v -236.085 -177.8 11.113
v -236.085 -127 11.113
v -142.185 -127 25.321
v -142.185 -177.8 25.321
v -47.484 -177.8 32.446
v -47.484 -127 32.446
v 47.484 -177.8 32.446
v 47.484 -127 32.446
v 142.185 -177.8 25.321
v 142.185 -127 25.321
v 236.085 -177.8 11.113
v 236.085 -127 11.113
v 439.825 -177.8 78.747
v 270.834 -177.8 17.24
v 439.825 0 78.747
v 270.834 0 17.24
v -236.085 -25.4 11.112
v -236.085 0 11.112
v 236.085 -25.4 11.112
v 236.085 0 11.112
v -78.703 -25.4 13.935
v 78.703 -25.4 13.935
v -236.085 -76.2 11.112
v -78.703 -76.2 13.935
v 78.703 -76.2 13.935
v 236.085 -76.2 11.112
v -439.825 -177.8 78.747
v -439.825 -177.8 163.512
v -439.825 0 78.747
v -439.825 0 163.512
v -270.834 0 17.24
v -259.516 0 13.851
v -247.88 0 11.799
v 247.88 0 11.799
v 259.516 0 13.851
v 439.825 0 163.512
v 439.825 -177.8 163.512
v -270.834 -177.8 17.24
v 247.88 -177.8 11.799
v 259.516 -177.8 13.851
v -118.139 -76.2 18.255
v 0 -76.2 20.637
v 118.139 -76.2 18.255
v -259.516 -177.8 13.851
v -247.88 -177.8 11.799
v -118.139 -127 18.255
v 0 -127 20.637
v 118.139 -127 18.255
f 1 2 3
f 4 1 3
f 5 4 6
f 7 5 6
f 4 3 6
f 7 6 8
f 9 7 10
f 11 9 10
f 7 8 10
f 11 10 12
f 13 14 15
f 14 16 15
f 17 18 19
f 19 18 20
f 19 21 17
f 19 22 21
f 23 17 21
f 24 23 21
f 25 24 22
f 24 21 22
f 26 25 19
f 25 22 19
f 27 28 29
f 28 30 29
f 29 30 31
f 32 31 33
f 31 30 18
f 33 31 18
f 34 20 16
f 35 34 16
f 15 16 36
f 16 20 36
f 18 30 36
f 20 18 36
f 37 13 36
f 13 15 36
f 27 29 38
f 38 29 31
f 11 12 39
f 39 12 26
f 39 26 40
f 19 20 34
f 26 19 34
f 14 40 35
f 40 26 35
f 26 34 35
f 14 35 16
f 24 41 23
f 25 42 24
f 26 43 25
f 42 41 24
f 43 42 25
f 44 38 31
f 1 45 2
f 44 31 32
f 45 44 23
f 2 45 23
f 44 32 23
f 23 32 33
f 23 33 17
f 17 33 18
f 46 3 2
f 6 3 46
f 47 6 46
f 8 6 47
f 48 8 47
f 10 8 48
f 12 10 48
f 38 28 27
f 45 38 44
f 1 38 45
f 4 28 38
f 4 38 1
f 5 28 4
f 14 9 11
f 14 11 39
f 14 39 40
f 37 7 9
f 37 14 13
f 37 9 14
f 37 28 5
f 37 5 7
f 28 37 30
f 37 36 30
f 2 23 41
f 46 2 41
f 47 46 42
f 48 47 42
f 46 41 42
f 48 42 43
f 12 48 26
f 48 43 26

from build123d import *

# Parameters (mm, degrees)
F1_DEPTH = 25.4
F2_R     = 101.6
F4_DEPTH = 50.8
F6_DEPTH = 50.8
F8_DEPTH = 50.8


with BuildPart() as f1:
    # F0 (on Front) → F1 (new body)
    with BuildSketch(Plane.XZ):
        Polygon((-439.8253767191, 78.747405897), (-254, 11.1125), (254, 11.1125), (439.8253767191, 78.747405897), (439.8253767191, 163.5125), (-439.8253767191, 163.5125), align=None)
    extrude(amount=F1_DEPTH)

    # F2
    f2_edges = [f1.edges().sort_by_distance(p)[0] for p in [
        (-254, -12.7, 11.1125),
        (254, -12.7, 11.1125),
    ]]
    fillet(f2_edges, radius=F2_R)

    # F3 (on face) → F4 (join)
    with BuildSketch(Plane.XZ.offset(25.4)):
        with BuildLine():
            ThreePointArc((-236.08517876, 11.1125), (0, 14.2875), (236.08517876, 11.1125))
            ThreePointArc((236.08517876, 11.1125), (253.727833611, 12.656032294), (270.8344253219, 17.2397297282))
            Line((270.8344253219, 17.2397297282), (439.8253767191, 78.747405897))
            Line((439.8253767191, 78.747405897), (439.8253767191, 163.5125))
            Line((439.8253767191, 163.5125), (-439.8253767191, 163.5125))
            Line((-439.8253767191, 163.5125), (-439.8253767191, 78.747405897))
            Line((-439.8253767191, 78.747405897), (-270.8344253219, 17.2397297282))
            ThreePointArc((-270.8344253219, 17.2397297282), (-253.727833611, 12.656032294), (-236.08517876, 11.1125))
        make_face()
    extrude(amount=F4_DEPTH)

    # F5 (on face) → F6 (join)
    with BuildSketch(Plane.XZ.offset(76.2)):
        with BuildLine():
            ThreePointArc((-236.08517876, 11.1125), (0, 20.6375), (236.08517876, 11.1125))
            ThreePointArc((236.08517876, 11.1125), (253.727833611, 12.656032294), (270.8344253219, 17.2397297282))
            Line((270.8344253219, 17.2397297282), (439.8253767191, 78.747405897))
            Line((439.8253767191, 78.747405897), (439.8253767191, 163.5125))
            Line((439.8253767191, 163.5125), (-439.8253767191, 163.5125))
            Line((-439.8253767191, 163.5125), (-439.8253767191, 78.747405897))
            Line((-439.8253767191, 78.747405897), (-270.8344253219, 17.2397297282))
            ThreePointArc((-270.8344253219, 17.2397297282), (-253.727833611, 12.656032294), (-236.08517876, 11.1125))
        make_face()
    extrude(amount=F6_DEPTH)

    # F7 (on face) → F8 (join)
    with BuildSketch(Plane.XZ.offset(127)):
        with BuildLine():
            ThreePointArc((-236.08517876, 11.1125), (0, 33.3375), (236.08517876, 11.1125))
            ThreePointArc((236.08517876, 11.1125), (253.727833611, 12.656032294), (270.8344253219, 17.2397297282))
            Line((270.8344253219, 17.2397297282), (439.8253767191, 78.747405897))
            Line((439.8253767191, 78.747405897), (439.8253767191, 163.5125))
            Line((439.8253767191, 163.5125), (-439.8253767191, 163.5125))
            Line((-439.8253767191, 163.5125), (-439.8253767191, 78.747405897))
            Line((-439.8253767191, 78.747405897), (-270.8344253219, 17.2397297282))
            ThreePointArc((-270.8344253219, 17.2397297282), (-253.727833611, 12.656032294), (-236.08517876, 11.1125))
        make_face()
    extrude(amount=F8_DEPTH)


solid = f1.part
